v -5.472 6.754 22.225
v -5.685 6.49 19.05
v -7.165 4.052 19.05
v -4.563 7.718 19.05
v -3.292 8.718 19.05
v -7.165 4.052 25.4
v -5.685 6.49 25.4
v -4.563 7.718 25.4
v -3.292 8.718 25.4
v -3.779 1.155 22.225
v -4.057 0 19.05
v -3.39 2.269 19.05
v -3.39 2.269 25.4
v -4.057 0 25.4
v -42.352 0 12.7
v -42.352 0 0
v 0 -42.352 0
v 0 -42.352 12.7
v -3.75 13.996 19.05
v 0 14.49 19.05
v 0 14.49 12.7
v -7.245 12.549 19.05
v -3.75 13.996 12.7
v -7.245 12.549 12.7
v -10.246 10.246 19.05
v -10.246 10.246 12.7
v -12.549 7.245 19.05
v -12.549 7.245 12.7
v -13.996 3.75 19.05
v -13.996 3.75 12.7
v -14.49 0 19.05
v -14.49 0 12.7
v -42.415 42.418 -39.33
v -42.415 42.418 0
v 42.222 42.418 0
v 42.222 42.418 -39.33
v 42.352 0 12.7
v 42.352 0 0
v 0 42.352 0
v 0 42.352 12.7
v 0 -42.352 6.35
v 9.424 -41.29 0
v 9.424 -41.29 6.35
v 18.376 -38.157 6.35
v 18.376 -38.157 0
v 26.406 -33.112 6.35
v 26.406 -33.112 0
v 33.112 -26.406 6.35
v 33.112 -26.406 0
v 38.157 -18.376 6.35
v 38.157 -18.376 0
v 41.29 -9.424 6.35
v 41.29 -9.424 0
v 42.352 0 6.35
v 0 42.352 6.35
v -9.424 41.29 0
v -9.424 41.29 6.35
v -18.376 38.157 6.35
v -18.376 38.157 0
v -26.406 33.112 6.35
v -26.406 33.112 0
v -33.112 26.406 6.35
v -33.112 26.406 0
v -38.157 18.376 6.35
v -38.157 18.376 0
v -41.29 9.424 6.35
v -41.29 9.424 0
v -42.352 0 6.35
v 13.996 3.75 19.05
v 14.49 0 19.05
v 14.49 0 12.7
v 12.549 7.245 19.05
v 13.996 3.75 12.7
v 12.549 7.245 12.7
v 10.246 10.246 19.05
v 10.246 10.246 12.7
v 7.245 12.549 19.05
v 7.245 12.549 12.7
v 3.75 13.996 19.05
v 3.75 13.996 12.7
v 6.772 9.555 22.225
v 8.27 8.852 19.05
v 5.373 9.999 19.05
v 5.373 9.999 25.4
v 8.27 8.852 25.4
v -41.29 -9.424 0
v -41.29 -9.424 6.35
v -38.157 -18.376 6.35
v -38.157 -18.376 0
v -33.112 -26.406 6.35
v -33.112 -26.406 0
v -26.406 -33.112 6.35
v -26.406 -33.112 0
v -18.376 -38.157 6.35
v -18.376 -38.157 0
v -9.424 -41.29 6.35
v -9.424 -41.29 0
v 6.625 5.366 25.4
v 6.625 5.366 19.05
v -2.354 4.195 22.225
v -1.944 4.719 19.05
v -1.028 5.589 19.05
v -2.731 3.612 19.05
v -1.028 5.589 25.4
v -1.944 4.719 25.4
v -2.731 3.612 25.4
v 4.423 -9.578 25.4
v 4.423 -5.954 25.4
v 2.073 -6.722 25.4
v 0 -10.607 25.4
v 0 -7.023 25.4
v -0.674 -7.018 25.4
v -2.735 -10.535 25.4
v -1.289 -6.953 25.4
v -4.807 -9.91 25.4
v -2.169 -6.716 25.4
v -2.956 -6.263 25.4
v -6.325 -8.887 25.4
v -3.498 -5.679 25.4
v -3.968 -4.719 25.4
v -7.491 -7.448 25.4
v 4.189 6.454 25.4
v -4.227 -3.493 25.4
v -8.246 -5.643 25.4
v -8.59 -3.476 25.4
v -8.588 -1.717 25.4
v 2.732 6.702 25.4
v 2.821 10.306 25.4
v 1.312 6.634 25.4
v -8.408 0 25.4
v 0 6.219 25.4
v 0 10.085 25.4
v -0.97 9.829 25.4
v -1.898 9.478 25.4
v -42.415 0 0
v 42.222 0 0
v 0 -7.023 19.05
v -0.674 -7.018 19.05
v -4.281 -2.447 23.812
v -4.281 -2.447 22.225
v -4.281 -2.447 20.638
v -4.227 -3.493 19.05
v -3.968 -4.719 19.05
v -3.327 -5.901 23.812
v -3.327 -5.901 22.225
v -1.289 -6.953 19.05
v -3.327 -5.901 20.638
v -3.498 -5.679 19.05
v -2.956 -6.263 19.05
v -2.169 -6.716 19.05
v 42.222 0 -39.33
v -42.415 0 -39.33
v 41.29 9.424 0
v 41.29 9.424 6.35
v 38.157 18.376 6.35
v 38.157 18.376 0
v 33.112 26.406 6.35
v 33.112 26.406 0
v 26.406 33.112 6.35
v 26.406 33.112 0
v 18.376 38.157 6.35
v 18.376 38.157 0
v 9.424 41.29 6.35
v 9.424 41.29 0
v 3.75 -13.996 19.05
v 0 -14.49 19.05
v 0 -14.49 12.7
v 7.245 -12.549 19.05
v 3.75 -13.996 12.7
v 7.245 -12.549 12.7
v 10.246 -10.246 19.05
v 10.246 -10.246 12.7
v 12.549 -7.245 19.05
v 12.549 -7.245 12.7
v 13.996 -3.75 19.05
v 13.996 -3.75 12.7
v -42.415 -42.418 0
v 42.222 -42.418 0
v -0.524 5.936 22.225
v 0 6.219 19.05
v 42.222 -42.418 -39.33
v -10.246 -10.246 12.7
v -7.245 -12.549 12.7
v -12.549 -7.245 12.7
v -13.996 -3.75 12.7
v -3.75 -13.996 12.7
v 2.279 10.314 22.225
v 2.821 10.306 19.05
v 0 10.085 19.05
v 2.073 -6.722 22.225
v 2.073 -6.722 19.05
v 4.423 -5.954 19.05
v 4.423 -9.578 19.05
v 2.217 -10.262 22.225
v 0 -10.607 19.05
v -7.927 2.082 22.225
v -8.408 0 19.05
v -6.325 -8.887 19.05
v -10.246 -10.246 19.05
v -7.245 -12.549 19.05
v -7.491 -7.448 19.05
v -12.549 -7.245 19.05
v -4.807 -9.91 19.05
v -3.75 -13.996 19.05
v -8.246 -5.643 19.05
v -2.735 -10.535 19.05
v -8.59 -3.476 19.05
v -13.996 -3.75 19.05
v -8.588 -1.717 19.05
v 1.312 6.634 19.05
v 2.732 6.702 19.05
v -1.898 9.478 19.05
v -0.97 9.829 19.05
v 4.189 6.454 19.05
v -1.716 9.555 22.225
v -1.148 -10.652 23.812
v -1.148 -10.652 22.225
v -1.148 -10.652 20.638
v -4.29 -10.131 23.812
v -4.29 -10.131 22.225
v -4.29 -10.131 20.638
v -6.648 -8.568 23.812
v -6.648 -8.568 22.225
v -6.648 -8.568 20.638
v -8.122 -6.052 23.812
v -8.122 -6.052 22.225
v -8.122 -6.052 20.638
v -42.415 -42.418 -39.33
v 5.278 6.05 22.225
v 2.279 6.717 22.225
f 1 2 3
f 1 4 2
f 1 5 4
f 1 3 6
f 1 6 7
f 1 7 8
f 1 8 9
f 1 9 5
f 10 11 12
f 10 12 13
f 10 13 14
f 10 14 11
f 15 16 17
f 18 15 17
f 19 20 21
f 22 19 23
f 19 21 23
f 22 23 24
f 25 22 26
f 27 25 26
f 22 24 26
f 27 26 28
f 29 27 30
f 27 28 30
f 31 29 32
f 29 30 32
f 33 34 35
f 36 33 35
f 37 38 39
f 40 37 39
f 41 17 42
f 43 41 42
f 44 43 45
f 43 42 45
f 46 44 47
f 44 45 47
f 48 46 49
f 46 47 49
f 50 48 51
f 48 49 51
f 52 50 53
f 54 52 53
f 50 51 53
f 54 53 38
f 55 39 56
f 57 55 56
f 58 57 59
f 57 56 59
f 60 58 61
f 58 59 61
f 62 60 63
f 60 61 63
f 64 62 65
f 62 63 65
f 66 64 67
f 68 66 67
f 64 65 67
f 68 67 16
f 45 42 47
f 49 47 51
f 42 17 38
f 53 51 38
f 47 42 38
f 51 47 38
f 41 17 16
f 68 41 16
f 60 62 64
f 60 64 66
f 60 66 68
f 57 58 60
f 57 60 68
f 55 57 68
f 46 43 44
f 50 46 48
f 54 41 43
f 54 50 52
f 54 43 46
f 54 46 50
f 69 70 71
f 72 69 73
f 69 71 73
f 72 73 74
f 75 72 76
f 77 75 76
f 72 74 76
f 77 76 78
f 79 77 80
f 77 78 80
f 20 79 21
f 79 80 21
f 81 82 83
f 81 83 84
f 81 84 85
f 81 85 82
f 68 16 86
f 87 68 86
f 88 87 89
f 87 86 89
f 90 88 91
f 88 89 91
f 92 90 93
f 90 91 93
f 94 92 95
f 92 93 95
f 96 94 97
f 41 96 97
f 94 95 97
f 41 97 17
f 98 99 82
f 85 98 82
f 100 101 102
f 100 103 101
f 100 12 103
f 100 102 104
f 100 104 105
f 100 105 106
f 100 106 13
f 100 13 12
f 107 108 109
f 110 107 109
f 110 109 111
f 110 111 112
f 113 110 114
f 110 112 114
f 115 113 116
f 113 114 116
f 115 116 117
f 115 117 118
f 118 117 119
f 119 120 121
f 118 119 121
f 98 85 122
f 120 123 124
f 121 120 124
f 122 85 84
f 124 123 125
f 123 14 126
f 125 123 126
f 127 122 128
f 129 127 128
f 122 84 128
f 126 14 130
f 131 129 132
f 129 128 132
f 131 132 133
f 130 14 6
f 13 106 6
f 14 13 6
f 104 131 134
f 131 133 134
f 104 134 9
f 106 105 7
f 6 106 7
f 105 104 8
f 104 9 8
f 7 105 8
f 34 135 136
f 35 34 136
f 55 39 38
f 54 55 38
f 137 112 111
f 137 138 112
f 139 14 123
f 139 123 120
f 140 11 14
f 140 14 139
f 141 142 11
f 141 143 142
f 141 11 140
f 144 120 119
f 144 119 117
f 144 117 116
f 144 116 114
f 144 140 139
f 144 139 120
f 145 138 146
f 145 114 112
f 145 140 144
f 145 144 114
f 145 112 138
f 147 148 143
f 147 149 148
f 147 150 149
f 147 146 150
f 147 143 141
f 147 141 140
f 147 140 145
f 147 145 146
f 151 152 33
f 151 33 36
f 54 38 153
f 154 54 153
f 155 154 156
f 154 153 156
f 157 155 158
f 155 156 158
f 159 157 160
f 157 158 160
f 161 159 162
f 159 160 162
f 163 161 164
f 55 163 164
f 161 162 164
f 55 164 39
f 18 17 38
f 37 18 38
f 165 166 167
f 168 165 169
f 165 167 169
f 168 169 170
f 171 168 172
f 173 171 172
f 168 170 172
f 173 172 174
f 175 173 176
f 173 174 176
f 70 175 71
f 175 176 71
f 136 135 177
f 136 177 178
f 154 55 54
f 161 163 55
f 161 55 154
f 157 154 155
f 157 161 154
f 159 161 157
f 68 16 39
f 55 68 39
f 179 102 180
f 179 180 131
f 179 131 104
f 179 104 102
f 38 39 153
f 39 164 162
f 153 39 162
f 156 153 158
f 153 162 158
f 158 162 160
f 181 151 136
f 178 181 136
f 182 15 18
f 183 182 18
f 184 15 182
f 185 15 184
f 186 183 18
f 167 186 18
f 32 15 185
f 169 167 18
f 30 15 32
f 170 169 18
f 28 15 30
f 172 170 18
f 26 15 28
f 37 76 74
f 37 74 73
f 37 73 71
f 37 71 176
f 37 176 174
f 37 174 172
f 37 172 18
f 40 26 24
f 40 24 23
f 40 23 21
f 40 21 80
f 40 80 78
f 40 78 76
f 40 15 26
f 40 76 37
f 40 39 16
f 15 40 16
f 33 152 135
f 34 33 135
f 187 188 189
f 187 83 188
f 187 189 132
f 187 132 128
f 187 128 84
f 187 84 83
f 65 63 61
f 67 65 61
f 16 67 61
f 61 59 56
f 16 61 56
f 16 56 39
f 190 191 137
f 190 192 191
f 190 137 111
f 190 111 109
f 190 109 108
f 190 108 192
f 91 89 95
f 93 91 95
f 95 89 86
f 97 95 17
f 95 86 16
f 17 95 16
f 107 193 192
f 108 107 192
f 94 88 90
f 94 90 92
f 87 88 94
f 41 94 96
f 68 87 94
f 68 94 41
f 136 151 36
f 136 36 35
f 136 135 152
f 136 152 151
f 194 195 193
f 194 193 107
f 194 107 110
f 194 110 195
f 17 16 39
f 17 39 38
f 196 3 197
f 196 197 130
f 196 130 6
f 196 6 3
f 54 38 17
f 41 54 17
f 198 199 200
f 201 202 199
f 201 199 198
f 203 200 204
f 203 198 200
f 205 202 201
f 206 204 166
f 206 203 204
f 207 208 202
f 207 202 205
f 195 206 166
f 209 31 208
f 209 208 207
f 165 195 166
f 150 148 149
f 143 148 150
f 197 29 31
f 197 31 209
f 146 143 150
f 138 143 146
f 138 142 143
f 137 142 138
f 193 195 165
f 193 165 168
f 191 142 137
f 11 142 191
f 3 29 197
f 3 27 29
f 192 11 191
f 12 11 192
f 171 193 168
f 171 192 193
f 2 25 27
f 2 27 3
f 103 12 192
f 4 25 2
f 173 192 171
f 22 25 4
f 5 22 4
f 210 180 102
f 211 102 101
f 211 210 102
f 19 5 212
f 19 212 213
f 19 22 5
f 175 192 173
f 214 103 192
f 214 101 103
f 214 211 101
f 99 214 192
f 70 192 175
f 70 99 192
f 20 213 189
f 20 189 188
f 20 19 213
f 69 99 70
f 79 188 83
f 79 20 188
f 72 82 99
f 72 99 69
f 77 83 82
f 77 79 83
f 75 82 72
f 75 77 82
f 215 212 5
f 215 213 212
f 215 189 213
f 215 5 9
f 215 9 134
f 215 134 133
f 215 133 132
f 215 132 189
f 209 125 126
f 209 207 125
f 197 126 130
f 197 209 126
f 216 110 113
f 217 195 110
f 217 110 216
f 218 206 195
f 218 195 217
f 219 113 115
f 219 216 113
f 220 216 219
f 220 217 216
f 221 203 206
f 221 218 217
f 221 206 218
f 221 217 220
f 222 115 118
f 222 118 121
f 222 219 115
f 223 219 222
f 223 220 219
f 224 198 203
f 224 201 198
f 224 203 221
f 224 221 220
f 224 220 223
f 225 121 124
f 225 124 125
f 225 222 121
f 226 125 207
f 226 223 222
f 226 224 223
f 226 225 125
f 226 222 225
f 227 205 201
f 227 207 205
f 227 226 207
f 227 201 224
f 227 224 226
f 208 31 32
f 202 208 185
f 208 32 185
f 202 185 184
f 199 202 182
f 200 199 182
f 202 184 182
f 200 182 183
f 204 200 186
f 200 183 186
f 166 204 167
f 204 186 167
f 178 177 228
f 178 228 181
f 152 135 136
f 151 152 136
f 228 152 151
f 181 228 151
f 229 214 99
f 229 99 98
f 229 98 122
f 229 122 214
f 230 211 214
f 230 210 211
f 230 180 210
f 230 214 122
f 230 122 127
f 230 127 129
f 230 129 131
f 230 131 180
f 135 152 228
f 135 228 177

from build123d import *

# Parameters (mm, degrees)
F1_DEPTH = 6.35
F2_DEPTH = 12.7
F3_DEPTH = 19.05
F4_DEPTH = 25.4
F5_DEPTH = 19.05
F6_W     = 84.6370868385
F6_H     = 39.3302179873
F7_DEPTH = 42.418
F8_DEPTH = 42.418


with BuildPart() as f1:
    # F0 (on Top) → F1 (new body)
    with BuildSketch(Plane.XY):
        with BuildLine():
            Line((-42.3516215858, 0), (0, 42.3516215858))
            ThreePointArc((0, 42.3516215858), (-29.9471188176, 29.9471188176), (-42.3516215858, 0))
        make_face()
    extrude(amount=F1_DEPTH)


with BuildPart() as f1b:
    # F0 (on Top) → F1, piece 2 (new body)
    with BuildSketch(Plane.XY):
        with BuildLine():
            Line((0, 42.3516215858), (42.3516215858, 0))
            ThreePointArc((42.3516215858, 0), (29.9471188176, 29.9471188176), (0, 42.3516215858))
        make_face()
    extrude(amount=F1_DEPTH)


with BuildPart() as f1c:
    # F0 (on Top) → F1, piece 3 (new body)
    with BuildSketch(Plane.XY):
        with BuildLine():
            ThreePointArc((0, -42.3516215858), (29.9471188176, -29.9471188176), (42.3516215858, 0))
            Line((42.3516215858, 0), (0, -42.3516215858))
        make_face()
    extrude(amount=F1_DEPTH)


with BuildPart() as f1d:
    # F0 (on Top) → F1, piece 4 (new body)
    with BuildSketch(Plane.XY):
        with BuildLine():
            ThreePointArc((-42.3516215858, 0), (-29.9471188176, -29.9471188176), (0, -42.3516215858))
            Line((0, -42.3516215858), (-42.3516215858, 0))
        make_face()
    extrude(amount=F1_DEPTH)


with BuildPart() as f2:
    # F0 (on Top) → F2 (new body)
    with BuildSketch(Plane.XY):
        with BuildLine():
            Line((0, 14.4900253138), (0, 42.3516215858))
            Line((0, 42.3516215858), (-42.3516215858, 0))
            Line((-42.3516215858, 0), (-14.4900253138, 0))
            ThreePointArc((-14.4900253138, 0), (-10.2459951589, 10.2459951589), (0, 14.4900253138))
        make_face()
        with BuildLine():
            Line((14.4900253138, 0), (42.3516215858, 0))
            Line((42.3516215858, 0), (0, 42.3516215858))
            Line((0, 42.3516215858), (0, 14.4900253138))
            ThreePointArc((0, 14.4900253138), (10.2459951589, 10.2459951589), (14.4900253138, 0))
        make_face()
        with BuildLine():
            Line((0, -42.3516215858), (42.3516215858, 0))
            Line((42.3516215858, 0), (14.4900253138, 0))
            ThreePointArc((14.4900253138, 0), (10.2459951589, -10.2459951589), (0, -14.4900253138))
            Line((0, -14.4900253138), (0, -42.3516215858))
        make_face()
        with BuildLine():
            Line((-42.3516215858, 0), (0, -42.3516215858))
            Line((0, -42.3516215858), (0, -14.4900253138))
            ThreePointArc((0, -14.4900253138), (-10.2459951589, -10.2459951589), (-14.4900253138, 0))
            Line((-14.4900253138, 0), (-42.3516215858, 0))
        make_face()
    extrude(amount=F2_DEPTH)

    # F0 (on Top) → F3 (join)
    with BuildSketch(Plane.XY):
        with BuildLine():
            Line((0, 10.0847837123), (0, 14.4900253138))
            ThreePointArc((0, 14.4900253138), (-10.2459951589, 10.2459951589), (-14.4900253138, 0))
            Line((-14.4900253138, 0), (-8.4076113491, 0))
            add(Edge.make_bspline(
                [(-8.4076113491, 0), (-8.0674152675, 2.1382154446), (-7.1649176971, 4.0515102938)],
                knots=[0.3769495817, 0.3769495817, 0.3769495817, 1, 1, 1], degree=2))
            add(Edge.make_bspline(
                [(-7.1649176971, 4.0515102938), (-5.7164031887, 7.1223610516), (-3.29181275, 8.7179554947)],
                knots=[0, 0, 0, 1, 1, 1], degree=2))
            add(Edge.make_bspline(
                [(-3.29181275, 8.7179554947), (-1.785286578, 9.7093826447), (0, 10.0847837123)],
                knots=[0, 0, 0, 0.6213528471, 0.6213528471, 0.6213528471], degree=2))
        make_face()
        with BuildLine():
            Line((0, 0), (14.4900253138, 0))
            ThreePointArc((14.4900253138, 0), (10.2459951589, 10.2459951589), (0, 14.4900253138))
            Line((0, 14.4900253138), (0, 10.0847837123))
            add(Edge.make_bspline(
                [(0, 10.0847837123), (1.0879384928, 10.3135499378), (2.2793968976, 10.3135499378)],
                knots=[0.6213528471, 0.6213528471, 0.6213528471, 1, 1, 1], degree=2))
            add(Edge.make_bspline(
                [(2.2793968976, 10.3135499378), (4.0220712755, 10.3135499378), (5.3725324941, 9.9993337136)],
                knots=[0, 0, 0, 1, 1, 1], degree=2))
            add(Edge.make_bspline(
                [(5.3725324941, 9.9993337136), (6.7229937127, 9.6851174895), (8.2695615109, 8.8516645262)],
                knots=[0, 0, 0, 1, 1, 1], degree=2))
            Line((8.2695615109, 8.8516645262), (6.6249404229, 5.3663157706))
            add(Edge.make_bspline(
                [(6.6249404229, 5.3663157706), (5.1496841081, 6.1908547985), (4.1892075649, 6.4538158939)],
                knots=[0, 0, 0, 1, 1, 1], degree=2))
            add(Edge.make_bspline(
                [(4.1892075649, 6.4538158939), (3.2287310216, 6.7167769892), (2.2793968976, 6.7167769892)],
                knots=[0, 0, 0, 1, 1, 1], degree=2))
            add(Edge.make_bspline(
                [(2.2793968976, 6.7167769892), (1.0589813809, 6.7167769892), (0, 6.2186936188)],
                knots=[0, 0, 0, 0.6646163427, 0.6646163427, 0.6646163427], degree=2))
            Line((0, 6.2186936188), (0, 0))
        make_face()
        with BuildLine():
            ThreePointArc((0, -14.4900253138), (10.2459951589, -10.2459951589), (14.4900253138, 0))
            Line((14.4900253138, 0), (0, 0))
            Line((0, 0), (0, -7.0234033811))
            add(Edge.make_bspline(
                [(0, -7.0234033811), (1.9334305116, -6.95443899), (4.4231983701, -5.9543822335)],
                knots=[0.0689604772, 0.0689604772, 0.0689604772, 1, 1, 1], degree=2))
            Line((4.4231983701, -5.9543822335), (4.4231983701, -9.5778969884))
            add(Edge.make_bspline(
                [(4.4231983701, -9.5778969884), (2.2228663266, -10.4318100681), (0, -10.606877871)],
                knots=[0, 0, 0, 0.7949817059, 0.7949817059, 0.7949817059], degree=2))
            Line((0, -10.606877871), (0, -14.4900253138))
        make_face()
        with BuildLine():
            ThreePointArc((-14.4900253138, 0), (-10.2459951589, -10.2459951589), (0, -14.4900253138))
            Line((0, -14.4900253138), (0, -10.606877871))
            add(Edge.make_bspline(
                [(0, -10.606877871), (-0.5732562888, -10.6520262084), (-1.1480112776, -10.6520262084)],
                knots=[0.7949817059, 0.7949817059, 0.7949817059, 1, 1, 1], degree=2))
            add(Edge.make_bspline(
                [(-1.1480112776, -10.6520262084), (-4.6823866781, -10.6520262084), (-6.6479094418, -8.5683938002)],
                knots=[0, 0, 0, 1, 1, 1], degree=2))
            add(Edge.make_bspline(
                [(-6.6479094418, -8.5683938002), (-8.6134322055, -6.484761392), (-8.6134322055, -2.6695970252)],
                knots=[0, 0, 0, 1, 1, 1], degree=2))
            add(Edge.make_bspline(
                [(-8.6134322055, -2.6695970252), (-8.6134322055, -1.2936343413), (-8.4076113491, 0)],
                knots=[0, 0, 0, 0.3769495817, 0.3769495817, 0.3769495817], degree=2))
            Line((-8.4076113491, 0), (-14.4900253138, 0))
        make_face()
    extrude(amount=F3_DEPTH)

    # F0 (on Top) → F4 (join)
    with BuildSketch(Plane.XY):
        with BuildLine():
            add(Edge.make_bspline(
                [(0, 10.0847837123), (1.0879384928, 10.3135499378), (2.2793968976, 10.3135499378)],
                knots=[0.6213528471, 0.6213528471, 0.6213528471, 1, 1, 1], degree=2))
            Line((0, 10.0847837123), (0, 6.2186936188))
            add(Edge.make_bspline(
                [(2.2793968976, 6.7167769892), (1.0589813809, 6.7167769892), (0, 6.2186936188)],
                knots=[0, 0, 0, 0.6646163427, 0.6646163427, 0.6646163427], degree=2))
            add(Edge.make_bspline(
                [(4.1892075649, 6.4538158939), (3.2287310216, 6.7167769892), (2.2793968976, 6.7167769892)],
                knots=[0, 0, 0, 1, 1, 1], degree=2))
            add(Edge.make_bspline(
                [(6.6249404229, 5.3663157706), (5.1496841081, 6.1908547985), (4.1892075649, 6.4538158939)],
                knots=[0, 0, 0, 1, 1, 1], degree=2))
            Line((6.6249404229, 5.3663157706), (8.2695615109, 8.8516645262))
            add(Edge.make_bspline(
                [(5.3725324941, 9.9993337136), (6.7229937127, 9.6851174895), (8.2695615109, 8.8516645262)],
                knots=[0, 0, 0, 1, 1, 1], degree=2))
            add(Edge.make_bspline(
                [(2.2793968976, 10.3135499378), (4.0220712755, 10.3135499378), (5.3725324941, 9.9993337136)],
                knots=[0, 0, 0, 1, 1, 1], degree=2))
        make_face()
        with BuildLine():
            add(Edge.make_bspline(
                [(0, -10.606877871), (-0.5732562888, -10.6520262084), (-1.1480112776, -10.6520262084)],
                knots=[0.7949817059, 0.7949817059, 0.7949817059, 1, 1, 1], degree=2))
            Line((0, -10.606877871), (0, -7.0234033811))
            add(Edge.make_bspline(
                [(-0.2833595403, -7.0285114536), (-0.1432058333, -7.0285114536), (0, -7.0234033811)],
                knots=[0, 0, 0, 0.0689604772, 0.0689604772, 0.0689604772], degree=2))
            add(Edge.make_bspline(
                [(-3.3274684918, -5.9008986209), (-2.3736774001, -7.0285114536), (-0.2833595403, -7.0285114536)],
                knots=[0, 0, 0, 1, 1, 1], degree=2))
            add(Edge.make_bspline(
                [(-4.2812595835, -2.4467486393), (-4.2812595835, -4.7732857882), (-3.3274684918, -5.9008986209)],
                knots=[0, 0, 0, 1, 1, 1], degree=2))
            add(Edge.make_bspline(
                [(-4.0571695007, 0), (-4.2812595835, -1.1819176543), (-4.2812595835, -2.4467486393)],
                knots=[0.4986089511, 0.4986089511, 0.4986089511, 1, 1, 1], degree=2))
            Line((-4.0571695007, 0), (-8.4076113491, 0))
            add(Edge.make_bspline(
                [(-8.6134322055, -2.6695970252), (-8.6134322055, -1.2936343413), (-8.4076113491, 0)],
                knots=[0, 0, 0, 0.3769495817, 0.3769495817, 0.3769495817], degree=2))
            add(Edge.make_bspline(
                [(-6.6479094418, -8.5683938002), (-8.6134322055, -6.484761392), (-8.6134322055, -2.6695970252)],
                knots=[0, 0, 0, 1, 1, 1], degree=2))
            add(Edge.make_bspline(
                [(-1.1480112776, -10.6520262084), (-4.6823866781, -10.6520262084), (-6.6479094418, -8.5683938002)],
                knots=[0, 0, 0, 1, 1, 1], degree=2))
        make_face()
        with BuildLine():
            Line((0, 6.2186936188), (0, 10.0847837123))
            add(Edge.make_bspline(
                [(-3.29181275, 8.7179554947), (-1.785286578, 9.7093826447), (0, 10.0847837123)],
                knots=[0, 0, 0, 0.6213528471, 0.6213528471, 0.6213528471], degree=2))
            add(Edge.make_bspline(
                [(-7.1649176971, 4.0515102938), (-5.7164031887, 7.1223610516), (-3.29181275, 8.7179554947)],
                knots=[0, 0, 0, 1, 1, 1], degree=2))
            add(Edge.make_bspline(
                [(-8.4076113491, 0), (-8.0674152675, 2.1382154446), (-7.1649176971, 4.0515102938)],
                knots=[0.3769495817, 0.3769495817, 0.3769495817, 1, 1, 1], degree=2))
            Line((-8.4076113491, 0), (-4.0571695007, 0))
            add(Edge.make_bspline(
                [(-3.3898660398, 2.2687232065), (-3.8343228397, 1.1753594789), (-4.0571695007, 0)],
                knots=[0, 0, 0, 0.4986089511, 0.4986089511, 0.4986089511], degree=2))
            add(Edge.make_bspline(
                [(-1.0276731492, 5.5891641565), (-2.4984724962, 4.4615513238), (-3.3898660398, 2.2687232065)],
                knots=[0, 0, 0, 1, 1, 1], degree=2))
            add(Edge.make_bspline(
                [(0, 6.2186936188), (-0.5343910851, 5.9673470724), (-1.0276731492, 5.5891641565)],
                knots=[0.6646163427, 0.6646163427, 0.6646163427, 1, 1, 1], degree=2))
        make_face()
        with BuildLine():
            Line((0, -7.0234033811), (0, -10.606877871))
            add(Edge.make_bspline(
                [(4.4231983701, -9.5778969884), (2.2228663266, -10.4318100681), (0, -10.606877871)],
                knots=[0, 0, 0, 0.7949817059, 0.7949817059, 0.7949817059], degree=2))
            Line((4.4231983701, -9.5778969884), (4.4231983701, -5.9543822335))
            add(Edge.make_bspline(
                [(0, -7.0234033811), (1.9334305116, -6.95443899), (4.4231983701, -5.9543822335)],
                knots=[0.0689604772, 0.0689604772, 0.0689604772, 1, 1, 1], degree=2))
        make_face()
    extrude(amount=F4_DEPTH)

    # F0 (on Top) → F5 (join)
    with BuildSketch(Plane.XY):
        with BuildLine():
            Line((0, -7.0234033811), (0, 0))
            Line((0, 0), (-4.0571695007, 0))
            add(Edge.make_bspline(
                [(-4.0571695007, 0), (-4.2812595835, -1.1819176543), (-4.2812595835, -2.4467486393)],
                knots=[0.4986089511, 0.4986089511, 0.4986089511, 1, 1, 1], degree=2))
            add(Edge.make_bspline(
                [(-4.2812595835, -2.4467486393), (-4.2812595835, -4.7732857882), (-3.3274684918, -5.9008986209)],
                knots=[0, 0, 0, 1, 1, 1], degree=2))
            add(Edge.make_bspline(
                [(-3.3274684918, -5.9008986209), (-2.3736774001, -7.0285114536), (-0.2833595403, -7.0285114536)],
                knots=[0, 0, 0, 1, 1, 1], degree=2))
            add(Edge.make_bspline(
                [(-0.2833595403, -7.0285114536), (-0.1432058333, -7.0285114536), (0, -7.0234033811)],
                knots=[0, 0, 0, 0.0689604772, 0.0689604772, 0.0689604772], degree=2))
        make_face()
        with BuildLine():
            Line((-4.0571695007, 0), (0, 0))
            Line((0, 0), (0, 6.2186936188))
            add(Edge.make_bspline(
                [(0, 6.2186936188), (-0.5343910851, 5.9673470724), (-1.0276731492, 5.5891641565)],
                knots=[0.6646163427, 0.6646163427, 0.6646163427, 1, 1, 1], degree=2))
            add(Edge.make_bspline(
                [(-1.0276731492, 5.5891641565), (-2.4984724962, 4.4615513238), (-3.3898660398, 2.2687232065)],
                knots=[0, 0, 0, 1, 1, 1], degree=2))
            add(Edge.make_bspline(
                [(-3.3898660398, 2.2687232065), (-3.8343228397, 1.1753594789), (-4.0571695007, 0)],
                knots=[0, 0, 0, 0.4986089511, 0.4986089511, 0.4986089511], degree=2))
        make_face()
    extrude(amount=F5_DEPTH)


with BuildPart() as f7:
    # F6 (on Front) → F7 (new body)
    with BuildSketch(Plane.XZ):
        with Locations((-0.0963974744, -19.6651089936)):
            Rectangle(F6_W, F6_H)
    extrude(amount=-F7_DEPTH)


with BuildPart() as f8:
    # F8 (new): a face of the model
    f8_faces = [f7.part.faces().sort_by_distance(p)[0] for p in [
        (-0.0963974744, 0, -19.6651089936),
    ]]
    extrude(f8_faces, amount=F8_DEPTH)


solid = Compound([f1.part, f1b.part, f1c.part, f1d.part, f2.part, f7.part, f8.part])
